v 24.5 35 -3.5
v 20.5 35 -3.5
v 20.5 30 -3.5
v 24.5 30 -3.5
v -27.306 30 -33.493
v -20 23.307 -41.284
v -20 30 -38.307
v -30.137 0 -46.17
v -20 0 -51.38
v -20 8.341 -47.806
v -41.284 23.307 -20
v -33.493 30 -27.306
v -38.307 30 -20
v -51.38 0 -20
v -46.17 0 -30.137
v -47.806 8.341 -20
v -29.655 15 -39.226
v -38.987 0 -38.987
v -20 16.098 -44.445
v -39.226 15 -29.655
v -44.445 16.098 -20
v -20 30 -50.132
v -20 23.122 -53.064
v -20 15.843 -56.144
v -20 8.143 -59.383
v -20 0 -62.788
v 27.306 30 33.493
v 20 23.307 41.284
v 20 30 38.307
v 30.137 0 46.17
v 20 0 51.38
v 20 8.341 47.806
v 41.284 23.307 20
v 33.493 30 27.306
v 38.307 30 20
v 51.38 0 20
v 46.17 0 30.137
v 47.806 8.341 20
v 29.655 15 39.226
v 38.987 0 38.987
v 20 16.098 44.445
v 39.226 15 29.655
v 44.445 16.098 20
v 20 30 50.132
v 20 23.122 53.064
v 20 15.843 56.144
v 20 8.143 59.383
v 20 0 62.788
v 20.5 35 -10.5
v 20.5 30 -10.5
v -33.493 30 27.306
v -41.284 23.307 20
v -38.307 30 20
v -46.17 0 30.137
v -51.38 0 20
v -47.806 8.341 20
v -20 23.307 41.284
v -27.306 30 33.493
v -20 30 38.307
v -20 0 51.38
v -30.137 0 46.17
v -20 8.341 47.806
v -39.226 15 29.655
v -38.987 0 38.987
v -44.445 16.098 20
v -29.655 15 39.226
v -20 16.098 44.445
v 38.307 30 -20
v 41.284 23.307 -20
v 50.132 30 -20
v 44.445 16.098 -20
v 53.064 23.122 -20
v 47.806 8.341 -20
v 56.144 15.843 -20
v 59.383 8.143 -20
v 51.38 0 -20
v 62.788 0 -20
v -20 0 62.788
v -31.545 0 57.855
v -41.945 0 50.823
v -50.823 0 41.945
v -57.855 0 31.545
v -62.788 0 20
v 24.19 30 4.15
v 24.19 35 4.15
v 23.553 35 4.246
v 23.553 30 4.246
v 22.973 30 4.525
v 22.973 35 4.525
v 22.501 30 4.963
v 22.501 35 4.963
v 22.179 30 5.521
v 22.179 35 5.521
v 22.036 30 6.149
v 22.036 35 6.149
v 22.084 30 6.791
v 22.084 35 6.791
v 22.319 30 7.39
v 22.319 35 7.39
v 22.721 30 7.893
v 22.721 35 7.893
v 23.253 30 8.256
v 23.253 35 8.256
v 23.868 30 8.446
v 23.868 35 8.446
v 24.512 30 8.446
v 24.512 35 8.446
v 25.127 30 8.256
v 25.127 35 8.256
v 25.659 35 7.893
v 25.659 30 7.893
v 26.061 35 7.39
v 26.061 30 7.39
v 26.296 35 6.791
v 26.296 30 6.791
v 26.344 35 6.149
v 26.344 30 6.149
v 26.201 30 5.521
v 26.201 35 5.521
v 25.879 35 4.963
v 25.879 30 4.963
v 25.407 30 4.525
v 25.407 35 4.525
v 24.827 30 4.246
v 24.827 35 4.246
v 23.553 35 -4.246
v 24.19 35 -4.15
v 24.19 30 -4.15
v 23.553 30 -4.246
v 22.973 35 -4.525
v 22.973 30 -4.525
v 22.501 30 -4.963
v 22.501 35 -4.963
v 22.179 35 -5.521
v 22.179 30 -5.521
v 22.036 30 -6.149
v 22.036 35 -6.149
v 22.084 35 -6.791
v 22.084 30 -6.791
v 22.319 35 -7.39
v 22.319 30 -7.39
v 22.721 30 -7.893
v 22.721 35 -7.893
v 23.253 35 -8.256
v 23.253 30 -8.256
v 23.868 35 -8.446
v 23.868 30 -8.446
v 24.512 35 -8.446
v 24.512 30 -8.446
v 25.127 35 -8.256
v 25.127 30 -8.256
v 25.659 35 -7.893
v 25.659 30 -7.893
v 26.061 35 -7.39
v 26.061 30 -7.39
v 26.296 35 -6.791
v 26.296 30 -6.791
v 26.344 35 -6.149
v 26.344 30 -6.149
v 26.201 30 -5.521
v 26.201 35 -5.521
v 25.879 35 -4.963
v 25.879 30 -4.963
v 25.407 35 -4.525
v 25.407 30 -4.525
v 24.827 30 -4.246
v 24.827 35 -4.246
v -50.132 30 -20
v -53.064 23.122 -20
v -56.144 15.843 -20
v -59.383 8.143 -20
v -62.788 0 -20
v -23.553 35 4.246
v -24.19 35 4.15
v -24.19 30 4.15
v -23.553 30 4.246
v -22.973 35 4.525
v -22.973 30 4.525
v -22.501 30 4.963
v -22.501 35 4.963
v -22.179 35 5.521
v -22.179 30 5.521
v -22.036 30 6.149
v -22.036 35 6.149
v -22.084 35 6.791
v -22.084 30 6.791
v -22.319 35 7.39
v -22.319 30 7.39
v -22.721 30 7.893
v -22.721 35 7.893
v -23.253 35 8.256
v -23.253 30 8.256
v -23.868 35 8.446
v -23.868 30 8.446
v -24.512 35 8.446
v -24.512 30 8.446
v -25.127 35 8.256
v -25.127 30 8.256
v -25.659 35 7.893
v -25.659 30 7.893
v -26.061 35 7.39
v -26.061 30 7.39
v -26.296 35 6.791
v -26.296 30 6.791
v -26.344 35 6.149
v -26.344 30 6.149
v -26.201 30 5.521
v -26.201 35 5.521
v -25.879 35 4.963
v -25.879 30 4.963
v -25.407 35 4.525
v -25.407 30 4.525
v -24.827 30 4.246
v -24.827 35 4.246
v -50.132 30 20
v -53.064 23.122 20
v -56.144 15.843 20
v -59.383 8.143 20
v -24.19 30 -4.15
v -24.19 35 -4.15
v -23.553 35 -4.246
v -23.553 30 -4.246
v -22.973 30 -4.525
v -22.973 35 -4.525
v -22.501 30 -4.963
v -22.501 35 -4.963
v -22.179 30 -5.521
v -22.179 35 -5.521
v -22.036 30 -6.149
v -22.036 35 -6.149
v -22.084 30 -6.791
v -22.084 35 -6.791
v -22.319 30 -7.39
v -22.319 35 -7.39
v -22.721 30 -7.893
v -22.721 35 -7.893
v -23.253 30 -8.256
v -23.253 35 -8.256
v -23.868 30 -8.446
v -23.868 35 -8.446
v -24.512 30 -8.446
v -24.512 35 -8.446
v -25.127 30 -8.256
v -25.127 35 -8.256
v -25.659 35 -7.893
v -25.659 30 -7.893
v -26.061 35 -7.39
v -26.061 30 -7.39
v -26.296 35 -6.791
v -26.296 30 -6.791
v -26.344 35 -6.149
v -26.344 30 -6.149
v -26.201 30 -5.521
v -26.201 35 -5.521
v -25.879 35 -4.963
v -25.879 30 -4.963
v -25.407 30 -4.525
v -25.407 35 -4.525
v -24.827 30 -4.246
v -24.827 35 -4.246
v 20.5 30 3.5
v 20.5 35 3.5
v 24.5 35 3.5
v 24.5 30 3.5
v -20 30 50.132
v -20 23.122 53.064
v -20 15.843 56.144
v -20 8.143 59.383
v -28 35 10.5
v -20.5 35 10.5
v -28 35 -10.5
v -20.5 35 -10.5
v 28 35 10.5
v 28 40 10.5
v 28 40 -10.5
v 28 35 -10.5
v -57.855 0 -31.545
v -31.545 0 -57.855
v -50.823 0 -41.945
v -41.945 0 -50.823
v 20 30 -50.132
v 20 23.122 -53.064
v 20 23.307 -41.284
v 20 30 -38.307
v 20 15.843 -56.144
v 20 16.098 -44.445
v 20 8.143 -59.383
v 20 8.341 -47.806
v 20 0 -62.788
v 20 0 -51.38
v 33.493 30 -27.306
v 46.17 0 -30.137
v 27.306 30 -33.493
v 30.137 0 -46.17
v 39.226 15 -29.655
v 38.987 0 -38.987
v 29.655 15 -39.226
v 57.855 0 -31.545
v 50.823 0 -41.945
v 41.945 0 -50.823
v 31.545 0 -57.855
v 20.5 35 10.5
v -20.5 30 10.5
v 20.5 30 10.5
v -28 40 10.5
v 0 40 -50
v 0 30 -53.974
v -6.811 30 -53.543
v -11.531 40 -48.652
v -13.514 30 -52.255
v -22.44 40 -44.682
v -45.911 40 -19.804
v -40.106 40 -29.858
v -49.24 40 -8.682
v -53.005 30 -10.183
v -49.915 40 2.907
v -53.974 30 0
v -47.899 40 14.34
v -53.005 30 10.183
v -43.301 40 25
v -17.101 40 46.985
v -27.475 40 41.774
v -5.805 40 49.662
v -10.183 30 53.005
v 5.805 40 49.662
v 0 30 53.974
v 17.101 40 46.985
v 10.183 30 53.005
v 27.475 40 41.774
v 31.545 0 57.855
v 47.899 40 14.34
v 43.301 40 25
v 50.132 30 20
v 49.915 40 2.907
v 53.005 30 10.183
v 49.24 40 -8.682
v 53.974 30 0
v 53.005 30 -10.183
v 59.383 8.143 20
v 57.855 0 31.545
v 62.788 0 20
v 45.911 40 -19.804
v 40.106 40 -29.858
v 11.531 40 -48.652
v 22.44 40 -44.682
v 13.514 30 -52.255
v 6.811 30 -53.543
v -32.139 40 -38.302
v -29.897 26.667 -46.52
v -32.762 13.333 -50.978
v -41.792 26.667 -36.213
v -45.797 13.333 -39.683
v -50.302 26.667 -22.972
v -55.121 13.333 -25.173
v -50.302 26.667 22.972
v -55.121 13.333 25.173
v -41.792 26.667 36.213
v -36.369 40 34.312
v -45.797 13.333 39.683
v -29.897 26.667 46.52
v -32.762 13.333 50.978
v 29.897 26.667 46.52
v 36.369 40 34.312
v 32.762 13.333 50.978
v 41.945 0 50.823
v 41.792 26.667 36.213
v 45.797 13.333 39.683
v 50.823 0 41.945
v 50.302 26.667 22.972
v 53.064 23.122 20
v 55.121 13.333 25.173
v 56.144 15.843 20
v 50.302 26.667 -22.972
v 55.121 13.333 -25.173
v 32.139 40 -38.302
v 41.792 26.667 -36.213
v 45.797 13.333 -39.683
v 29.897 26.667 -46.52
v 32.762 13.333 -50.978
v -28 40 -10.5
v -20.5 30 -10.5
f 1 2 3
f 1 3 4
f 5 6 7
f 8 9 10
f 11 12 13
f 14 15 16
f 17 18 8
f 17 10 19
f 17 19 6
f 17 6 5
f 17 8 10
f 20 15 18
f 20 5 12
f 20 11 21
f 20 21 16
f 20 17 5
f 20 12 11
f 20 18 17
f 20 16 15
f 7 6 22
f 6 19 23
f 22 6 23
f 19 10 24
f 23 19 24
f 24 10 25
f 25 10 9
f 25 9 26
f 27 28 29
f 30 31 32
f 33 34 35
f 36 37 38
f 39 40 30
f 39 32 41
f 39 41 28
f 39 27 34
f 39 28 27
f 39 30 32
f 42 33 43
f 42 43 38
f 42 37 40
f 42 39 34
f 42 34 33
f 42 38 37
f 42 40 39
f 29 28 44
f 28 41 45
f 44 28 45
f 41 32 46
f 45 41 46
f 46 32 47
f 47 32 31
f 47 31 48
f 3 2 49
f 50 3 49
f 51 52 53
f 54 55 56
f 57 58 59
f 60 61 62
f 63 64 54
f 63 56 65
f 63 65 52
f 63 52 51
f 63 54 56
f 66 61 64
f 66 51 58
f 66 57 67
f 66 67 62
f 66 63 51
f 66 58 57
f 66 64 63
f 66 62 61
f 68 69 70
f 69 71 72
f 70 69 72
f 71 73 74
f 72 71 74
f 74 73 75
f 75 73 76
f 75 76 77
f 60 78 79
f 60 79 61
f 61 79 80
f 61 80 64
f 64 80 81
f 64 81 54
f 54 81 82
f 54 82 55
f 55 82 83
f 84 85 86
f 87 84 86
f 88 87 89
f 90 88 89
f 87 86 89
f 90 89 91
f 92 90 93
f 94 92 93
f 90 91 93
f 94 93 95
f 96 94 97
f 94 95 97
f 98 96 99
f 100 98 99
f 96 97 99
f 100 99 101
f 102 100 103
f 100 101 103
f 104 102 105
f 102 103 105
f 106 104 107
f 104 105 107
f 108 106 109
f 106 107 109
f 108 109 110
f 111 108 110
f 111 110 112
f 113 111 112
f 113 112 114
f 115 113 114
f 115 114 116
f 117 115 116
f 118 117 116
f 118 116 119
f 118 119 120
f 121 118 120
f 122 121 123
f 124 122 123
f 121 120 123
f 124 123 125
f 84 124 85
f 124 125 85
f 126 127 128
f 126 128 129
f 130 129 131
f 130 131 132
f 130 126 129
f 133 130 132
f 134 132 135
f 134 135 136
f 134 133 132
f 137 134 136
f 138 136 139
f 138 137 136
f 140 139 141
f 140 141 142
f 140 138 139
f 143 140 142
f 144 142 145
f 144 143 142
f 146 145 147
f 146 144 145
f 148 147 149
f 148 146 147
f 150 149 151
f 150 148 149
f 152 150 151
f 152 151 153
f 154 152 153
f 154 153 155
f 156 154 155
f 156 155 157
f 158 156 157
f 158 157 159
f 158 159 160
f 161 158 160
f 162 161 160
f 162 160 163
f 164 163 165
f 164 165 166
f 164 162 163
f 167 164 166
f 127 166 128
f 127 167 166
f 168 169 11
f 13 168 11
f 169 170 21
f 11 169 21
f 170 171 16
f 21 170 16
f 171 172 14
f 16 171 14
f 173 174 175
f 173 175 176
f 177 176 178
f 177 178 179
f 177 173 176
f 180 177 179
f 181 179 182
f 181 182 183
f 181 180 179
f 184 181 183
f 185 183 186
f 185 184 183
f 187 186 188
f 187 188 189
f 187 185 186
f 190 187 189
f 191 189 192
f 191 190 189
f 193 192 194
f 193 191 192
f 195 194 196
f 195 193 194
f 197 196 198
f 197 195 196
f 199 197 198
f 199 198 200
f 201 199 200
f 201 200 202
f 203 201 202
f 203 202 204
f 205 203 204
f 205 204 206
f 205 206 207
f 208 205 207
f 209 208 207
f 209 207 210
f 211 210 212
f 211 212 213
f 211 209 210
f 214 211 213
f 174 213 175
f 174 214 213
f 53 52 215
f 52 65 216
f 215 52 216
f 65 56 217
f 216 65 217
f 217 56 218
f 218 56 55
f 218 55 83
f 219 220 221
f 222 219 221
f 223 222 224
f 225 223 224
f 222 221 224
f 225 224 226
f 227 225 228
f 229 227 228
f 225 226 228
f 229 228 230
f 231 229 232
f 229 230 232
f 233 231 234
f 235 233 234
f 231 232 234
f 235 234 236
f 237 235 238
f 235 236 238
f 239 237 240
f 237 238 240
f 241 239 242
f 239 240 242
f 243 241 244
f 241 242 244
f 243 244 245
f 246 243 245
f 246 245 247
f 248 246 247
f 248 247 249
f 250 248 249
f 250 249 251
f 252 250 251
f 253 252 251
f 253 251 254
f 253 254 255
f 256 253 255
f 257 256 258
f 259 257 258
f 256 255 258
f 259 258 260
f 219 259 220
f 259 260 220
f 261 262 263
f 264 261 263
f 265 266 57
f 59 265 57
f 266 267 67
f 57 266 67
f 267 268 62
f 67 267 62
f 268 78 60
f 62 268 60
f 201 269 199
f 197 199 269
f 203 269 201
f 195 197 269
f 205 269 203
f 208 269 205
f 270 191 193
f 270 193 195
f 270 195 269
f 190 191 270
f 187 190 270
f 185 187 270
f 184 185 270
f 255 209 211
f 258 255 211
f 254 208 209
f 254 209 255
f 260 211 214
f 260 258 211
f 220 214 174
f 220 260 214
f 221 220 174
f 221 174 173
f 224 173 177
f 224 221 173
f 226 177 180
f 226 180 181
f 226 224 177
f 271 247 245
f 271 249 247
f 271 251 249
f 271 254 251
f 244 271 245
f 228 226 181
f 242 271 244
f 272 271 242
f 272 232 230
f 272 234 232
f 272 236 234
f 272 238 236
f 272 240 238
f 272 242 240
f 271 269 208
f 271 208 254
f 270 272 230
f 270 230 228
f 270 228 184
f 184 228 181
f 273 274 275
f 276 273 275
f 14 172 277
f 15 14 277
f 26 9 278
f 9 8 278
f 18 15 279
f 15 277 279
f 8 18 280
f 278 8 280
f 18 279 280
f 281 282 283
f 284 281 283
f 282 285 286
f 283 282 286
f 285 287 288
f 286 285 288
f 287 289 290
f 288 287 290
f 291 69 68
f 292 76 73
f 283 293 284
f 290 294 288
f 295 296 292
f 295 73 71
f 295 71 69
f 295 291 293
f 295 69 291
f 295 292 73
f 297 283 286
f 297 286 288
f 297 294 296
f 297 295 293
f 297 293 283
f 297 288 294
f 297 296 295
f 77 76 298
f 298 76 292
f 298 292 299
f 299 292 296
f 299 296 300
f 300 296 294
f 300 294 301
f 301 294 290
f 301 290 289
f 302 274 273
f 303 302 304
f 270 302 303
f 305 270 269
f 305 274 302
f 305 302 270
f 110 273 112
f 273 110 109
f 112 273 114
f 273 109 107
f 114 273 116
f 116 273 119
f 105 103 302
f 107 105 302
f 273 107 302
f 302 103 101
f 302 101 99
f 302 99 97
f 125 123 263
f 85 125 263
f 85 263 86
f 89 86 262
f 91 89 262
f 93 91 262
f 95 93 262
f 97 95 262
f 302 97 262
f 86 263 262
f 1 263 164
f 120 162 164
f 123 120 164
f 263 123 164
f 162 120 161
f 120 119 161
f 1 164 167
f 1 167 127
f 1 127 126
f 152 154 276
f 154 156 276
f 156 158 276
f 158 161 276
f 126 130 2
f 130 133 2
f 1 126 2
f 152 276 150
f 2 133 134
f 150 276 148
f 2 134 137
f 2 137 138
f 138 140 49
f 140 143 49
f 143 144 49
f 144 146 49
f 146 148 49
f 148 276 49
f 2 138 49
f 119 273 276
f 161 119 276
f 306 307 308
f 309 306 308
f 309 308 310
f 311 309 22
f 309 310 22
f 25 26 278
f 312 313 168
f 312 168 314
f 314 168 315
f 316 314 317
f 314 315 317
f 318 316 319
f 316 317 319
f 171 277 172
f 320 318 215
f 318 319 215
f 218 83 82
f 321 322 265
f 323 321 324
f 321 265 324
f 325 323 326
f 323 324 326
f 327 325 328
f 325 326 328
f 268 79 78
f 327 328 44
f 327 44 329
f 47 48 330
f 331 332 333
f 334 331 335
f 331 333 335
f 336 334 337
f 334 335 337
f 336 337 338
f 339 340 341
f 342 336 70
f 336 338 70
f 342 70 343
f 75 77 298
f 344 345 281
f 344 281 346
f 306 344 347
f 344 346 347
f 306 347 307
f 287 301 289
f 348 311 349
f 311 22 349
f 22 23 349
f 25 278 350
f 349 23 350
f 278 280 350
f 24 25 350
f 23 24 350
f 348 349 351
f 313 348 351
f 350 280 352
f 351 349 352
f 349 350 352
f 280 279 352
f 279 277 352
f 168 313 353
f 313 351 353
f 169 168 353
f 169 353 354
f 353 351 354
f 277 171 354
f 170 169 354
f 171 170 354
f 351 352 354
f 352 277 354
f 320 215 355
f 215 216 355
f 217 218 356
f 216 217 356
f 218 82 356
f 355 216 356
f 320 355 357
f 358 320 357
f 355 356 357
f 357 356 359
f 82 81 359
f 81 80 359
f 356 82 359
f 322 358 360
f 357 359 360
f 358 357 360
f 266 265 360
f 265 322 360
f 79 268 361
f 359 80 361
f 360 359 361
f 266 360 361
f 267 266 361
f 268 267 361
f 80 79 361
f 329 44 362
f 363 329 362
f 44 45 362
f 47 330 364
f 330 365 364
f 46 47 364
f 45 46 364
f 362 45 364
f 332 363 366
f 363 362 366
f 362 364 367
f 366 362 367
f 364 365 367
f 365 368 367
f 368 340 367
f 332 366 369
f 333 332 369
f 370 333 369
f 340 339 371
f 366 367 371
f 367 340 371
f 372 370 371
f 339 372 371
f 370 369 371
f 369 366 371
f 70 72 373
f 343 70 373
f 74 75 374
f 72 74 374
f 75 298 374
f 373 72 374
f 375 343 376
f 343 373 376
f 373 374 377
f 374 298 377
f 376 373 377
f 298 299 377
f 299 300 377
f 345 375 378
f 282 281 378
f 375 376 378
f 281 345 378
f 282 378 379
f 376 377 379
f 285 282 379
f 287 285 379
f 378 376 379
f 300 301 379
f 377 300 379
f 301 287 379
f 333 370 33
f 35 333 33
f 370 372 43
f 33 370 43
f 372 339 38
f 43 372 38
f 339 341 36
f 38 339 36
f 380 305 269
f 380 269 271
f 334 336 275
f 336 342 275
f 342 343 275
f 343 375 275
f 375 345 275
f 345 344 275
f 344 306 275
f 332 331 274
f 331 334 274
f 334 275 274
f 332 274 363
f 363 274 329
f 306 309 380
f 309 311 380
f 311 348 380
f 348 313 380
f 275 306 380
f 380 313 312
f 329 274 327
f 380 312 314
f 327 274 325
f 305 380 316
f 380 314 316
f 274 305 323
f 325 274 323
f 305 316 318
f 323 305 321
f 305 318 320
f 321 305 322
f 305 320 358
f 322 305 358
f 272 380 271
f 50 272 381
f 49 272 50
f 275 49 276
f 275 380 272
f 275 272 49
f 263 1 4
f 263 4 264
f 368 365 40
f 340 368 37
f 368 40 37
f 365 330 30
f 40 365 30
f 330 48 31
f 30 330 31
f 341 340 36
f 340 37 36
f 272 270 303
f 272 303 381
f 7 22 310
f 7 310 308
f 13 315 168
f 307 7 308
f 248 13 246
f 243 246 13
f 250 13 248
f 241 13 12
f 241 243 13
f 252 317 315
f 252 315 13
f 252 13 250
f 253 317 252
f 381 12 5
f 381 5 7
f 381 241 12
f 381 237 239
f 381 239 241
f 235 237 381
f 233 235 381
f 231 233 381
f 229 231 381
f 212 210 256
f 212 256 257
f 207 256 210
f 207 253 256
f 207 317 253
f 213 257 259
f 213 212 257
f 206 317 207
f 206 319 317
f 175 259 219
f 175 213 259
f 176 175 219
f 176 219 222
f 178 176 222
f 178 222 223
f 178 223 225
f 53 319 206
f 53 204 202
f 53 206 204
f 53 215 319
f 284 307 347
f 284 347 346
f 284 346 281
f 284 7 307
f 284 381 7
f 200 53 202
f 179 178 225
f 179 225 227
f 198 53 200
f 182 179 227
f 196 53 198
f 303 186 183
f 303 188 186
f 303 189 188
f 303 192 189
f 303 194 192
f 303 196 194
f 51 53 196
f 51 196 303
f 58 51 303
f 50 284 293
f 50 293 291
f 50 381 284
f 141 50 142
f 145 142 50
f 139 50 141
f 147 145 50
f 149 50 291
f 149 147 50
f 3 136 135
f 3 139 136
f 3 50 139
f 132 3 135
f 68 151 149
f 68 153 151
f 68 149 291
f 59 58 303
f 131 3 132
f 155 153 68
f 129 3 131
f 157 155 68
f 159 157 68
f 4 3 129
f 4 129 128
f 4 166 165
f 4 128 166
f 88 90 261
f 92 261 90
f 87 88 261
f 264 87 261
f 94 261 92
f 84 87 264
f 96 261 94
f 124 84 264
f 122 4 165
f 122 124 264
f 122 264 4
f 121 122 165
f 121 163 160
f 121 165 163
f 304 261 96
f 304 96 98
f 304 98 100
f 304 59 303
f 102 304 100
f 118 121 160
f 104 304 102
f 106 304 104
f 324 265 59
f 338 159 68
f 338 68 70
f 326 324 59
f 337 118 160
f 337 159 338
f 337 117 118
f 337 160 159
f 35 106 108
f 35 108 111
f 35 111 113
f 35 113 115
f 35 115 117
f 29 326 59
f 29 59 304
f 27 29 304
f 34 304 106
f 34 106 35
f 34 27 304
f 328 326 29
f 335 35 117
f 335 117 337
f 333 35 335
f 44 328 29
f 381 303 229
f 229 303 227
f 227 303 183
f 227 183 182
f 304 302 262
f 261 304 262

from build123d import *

# Parameters (mm, degrees)
SHELL1_T                = -10
SKETCH4_W               = 41
SKETCH4_H               = 21
CUT_EXTRUDE1_DEPTH      = 10
SKETCH5_W               = 7.5
SKETCH5_H               = 21
CUT_EXTRUDE2_DEPTH      = 5
SKETCH6_R               = 2.16
CUT_EXTRUDE3_DEPTH      = 5
MIRROR1_COPY_1_SKETCH_R = 2.16
MIRROR1_COPY_1_DEPTH    = 5
SKETCH7_W               = 4
SKETCH7_H               = 3.5
CUT_EXTRUDE4_DEPTH      = 10
CUT_EXTRUDE7_DEPTH      = 30


with BuildPart() as part:
    # Sketch2 → Revolve1 (revolve)
    with BuildSketch(Plane.XY, mode=Mode.PRIVATE) as revolve1_sk:
        Polygon((0, 0), (0, 40), (-50, 40), (-65.896319649, 0), align=None)
    revolve(revolve1_sk.sketch.rotate(Axis((0, 0, 0), (0, 1, 0)), 270), axis=Axis((0, 0, 0), (0, 1, 0)))

    # Shell1
    shell1_openings = [part.faces().sort_by_distance(p)[0] for p in [
        (0, 0, 0),
    ]]
    offset(amount=SHELL1_T, openings=shell1_openings, kind=Kind.INTERSECTION)

    # Sketch4 → Cut-Extrude1 (cut)
    with BuildSketch(Plane(origin=(0, 40, 0), x_dir=(1, 0, 0), z_dir=(0, 1, 0))):
        Rectangle(SKETCH4_W, SKETCH4_H)
    extrude(amount=-CUT_EXTRUDE1_DEPTH, mode=Mode.SUBTRACT)

    # Sketch5 → Cut-Extrude2 (cut)
    with BuildSketch(Plane(origin=(0, 40, 0), x_dir=(1, 0, 0), z_dir=(0, 1, 0))):
        with Locations((-24.25, 0)):
            Rectangle(SKETCH5_W, SKETCH5_H)
    cut_extrude2 = extrude(amount=-CUT_EXTRUDE2_DEPTH, mode=Mode.SUBTRACT)

    # Sketch6 → Cut-Extrude3 (cut)
    with BuildSketch(Plane(origin=(0, 35, 0), x_dir=(1, 0, 0), z_dir=(0, 1, 0))):
        with Locations(Location((-24.19, 6.31, 0), (0, 0, 270))):
            Circle(SKETCH6_R)
    cut_extrude3 = extrude(amount=-CUT_EXTRUDE3_DEPTH, mode=Mode.SUBTRACT)

    # Mirror2: Cut-Extrude3 across plane
    add(cut_extrude3.mirror(Plane.XY), mode=Mode.SUBTRACT)

    # Mirror1: Cut-Extrude2, Cut-Extrude3 across plane
    add(cut_extrude2.mirror(Plane(origin=(0, 0, 0), x_dir=(0, 0, 1), z_dir=(1, 0, 0))), mode=Mode.SUBTRACT)
    add(cut_extrude3.mirror(Plane(origin=(0, 0, 0), x_dir=(0, 0, 1), z_dir=(1, 0, 0))), mode=Mode.SUBTRACT)

    # Mirror1 copy 1 sketch → Mirror1 copy 1 (cut)
    with BuildSketch(Plane(origin=(0, 35, 0), x_dir=(-1, 0, 0), z_dir=(0, 1, 0))):
        with Locations(Location((-24.19, 6.31, 0), (0, 0, 270))):
            Circle(MIRROR1_COPY_1_SKETCH_R)
    extrude(amount=-MIRROR1_COPY_1_DEPTH, mode=Mode.SUBTRACT)

    # Sketch7 → Cut-Extrude4 (cut)
    with BuildSketch(Plane(origin=(0, 35, 0), x_dir=(1, 0, 0), z_dir=(0, 1, 0))):
        with Locations((22.5, -1.75)):
            Rectangle(SKETCH7_W, SKETCH7_H)
    cut_extrude4 = extrude(amount=-CUT_EXTRUDE4_DEPTH, mode=Mode.SUBTRACT)

    # Mirror3: Cut-Extrude4 across plane
    add(cut_extrude4.mirror(Plane.XY), mode=Mode.SUBTRACT)

    # Sketch8 → Cut-Extrude7 (cut)
    with BuildSketch(Plane.XZ):
        with BuildLine():
            Line((-20, 51.38028066), (-20, 20))
            Line((-20, 20), (20, 20))
            Line((20, 20), (20, 51.38028066))
            ThreePointArc((20, 51.38028066), (0, 55.135589602), (-20, 51.38028066))
        make_face()
        with BuildLine():
            Line((-20, -51.38028066), (-20, -62.787936288))
            ThreePointArc((-20, -62.787936288), (0, -65.896319649), (20, -62.787936288))
            Line((20, -62.787936288), (20, -51.38028066))
            ThreePointArc((20, -51.38028066), (0, -55.135589602), (-20, -51.38028066))
        make_face()
        with BuildLine():
            ThreePointArc((20, 62.787936288), (0, 65.896319649), (-20, 62.787936288))
            Line((-20, 62.787936288), (-20, 51.38028066))
            ThreePointArc((-20, 51.38028066), (0, 55.135589602), (20, 51.38028066))
            Line((20, 51.38028066), (20, 62.787936288))
        make_face()
        with BuildLine():
            Line((-51.38028066, -20), (-20, -20))
            Line((-20, -20), (-20, 20))
            Line((-20, 20), (-51.38028066, 20))
            ThreePointArc((-51.38028066, 20), (-55.135589602, 0), (-51.38028066, -20))
        make_face()
        with BuildLine():
            ThreePointArc((-62.787936288, 20), (-65.896319649, 0), (-62.787936288, -20))
            Line((-62.787936288, -20), (-51.38028066, -20))
            ThreePointArc((-51.38028066, -20), (-55.135589602, 0), (-51.38028066, 20))
            Line((-51.38028066, 20), (-62.787936288, 20))
        make_face()
        with BuildLine():
            Line((51.38028066, -20), (62.787936288, -20))
            ThreePointArc((62.787936288, -20), (65.114586933, -10.12005493), (65.896319649, 0))
            ThreePointArc((65.896319649, 0), (65.114586933, 10.12005493), (62.787936288, 20))
            Line((62.787936288, 20), (51.38028066, 20))
            ThreePointArc((51.38028066, 20), (54.188630306, 10.174752396), (55.135589602, 0))
            ThreePointArc((55.135589602, 0), (54.188630306, -10.174752396), (51.38028066, -20))
        make_face()
        with BuildLine():
            Line((-20, -20), (-20, -51.38028066))
            ThreePointArc((-20, -51.38028066), (0, -55.135589602), (20, -51.38028066))
            Line((20, -51.38028066), (20, -20))
            Line((20, -20), (-20, -20))
        make_face()
        with BuildLine():
            Line((20, 20), (20, -20))
            Line((20, -20), (51.38028066, -20))
            ThreePointArc((51.38028066, -20), (54.188630306, -10.174752396), (55.135589602, 0))
            ThreePointArc((55.135589602, 0), (54.188630306, 10.174752396), (51.38028066, 20))
            Line((51.38028066, 20), (20, 20))
        make_face()
    extrude(amount=-CUT_EXTRUDE7_DEPTH, mode=Mode.SUBTRACT)


solid = part.part
